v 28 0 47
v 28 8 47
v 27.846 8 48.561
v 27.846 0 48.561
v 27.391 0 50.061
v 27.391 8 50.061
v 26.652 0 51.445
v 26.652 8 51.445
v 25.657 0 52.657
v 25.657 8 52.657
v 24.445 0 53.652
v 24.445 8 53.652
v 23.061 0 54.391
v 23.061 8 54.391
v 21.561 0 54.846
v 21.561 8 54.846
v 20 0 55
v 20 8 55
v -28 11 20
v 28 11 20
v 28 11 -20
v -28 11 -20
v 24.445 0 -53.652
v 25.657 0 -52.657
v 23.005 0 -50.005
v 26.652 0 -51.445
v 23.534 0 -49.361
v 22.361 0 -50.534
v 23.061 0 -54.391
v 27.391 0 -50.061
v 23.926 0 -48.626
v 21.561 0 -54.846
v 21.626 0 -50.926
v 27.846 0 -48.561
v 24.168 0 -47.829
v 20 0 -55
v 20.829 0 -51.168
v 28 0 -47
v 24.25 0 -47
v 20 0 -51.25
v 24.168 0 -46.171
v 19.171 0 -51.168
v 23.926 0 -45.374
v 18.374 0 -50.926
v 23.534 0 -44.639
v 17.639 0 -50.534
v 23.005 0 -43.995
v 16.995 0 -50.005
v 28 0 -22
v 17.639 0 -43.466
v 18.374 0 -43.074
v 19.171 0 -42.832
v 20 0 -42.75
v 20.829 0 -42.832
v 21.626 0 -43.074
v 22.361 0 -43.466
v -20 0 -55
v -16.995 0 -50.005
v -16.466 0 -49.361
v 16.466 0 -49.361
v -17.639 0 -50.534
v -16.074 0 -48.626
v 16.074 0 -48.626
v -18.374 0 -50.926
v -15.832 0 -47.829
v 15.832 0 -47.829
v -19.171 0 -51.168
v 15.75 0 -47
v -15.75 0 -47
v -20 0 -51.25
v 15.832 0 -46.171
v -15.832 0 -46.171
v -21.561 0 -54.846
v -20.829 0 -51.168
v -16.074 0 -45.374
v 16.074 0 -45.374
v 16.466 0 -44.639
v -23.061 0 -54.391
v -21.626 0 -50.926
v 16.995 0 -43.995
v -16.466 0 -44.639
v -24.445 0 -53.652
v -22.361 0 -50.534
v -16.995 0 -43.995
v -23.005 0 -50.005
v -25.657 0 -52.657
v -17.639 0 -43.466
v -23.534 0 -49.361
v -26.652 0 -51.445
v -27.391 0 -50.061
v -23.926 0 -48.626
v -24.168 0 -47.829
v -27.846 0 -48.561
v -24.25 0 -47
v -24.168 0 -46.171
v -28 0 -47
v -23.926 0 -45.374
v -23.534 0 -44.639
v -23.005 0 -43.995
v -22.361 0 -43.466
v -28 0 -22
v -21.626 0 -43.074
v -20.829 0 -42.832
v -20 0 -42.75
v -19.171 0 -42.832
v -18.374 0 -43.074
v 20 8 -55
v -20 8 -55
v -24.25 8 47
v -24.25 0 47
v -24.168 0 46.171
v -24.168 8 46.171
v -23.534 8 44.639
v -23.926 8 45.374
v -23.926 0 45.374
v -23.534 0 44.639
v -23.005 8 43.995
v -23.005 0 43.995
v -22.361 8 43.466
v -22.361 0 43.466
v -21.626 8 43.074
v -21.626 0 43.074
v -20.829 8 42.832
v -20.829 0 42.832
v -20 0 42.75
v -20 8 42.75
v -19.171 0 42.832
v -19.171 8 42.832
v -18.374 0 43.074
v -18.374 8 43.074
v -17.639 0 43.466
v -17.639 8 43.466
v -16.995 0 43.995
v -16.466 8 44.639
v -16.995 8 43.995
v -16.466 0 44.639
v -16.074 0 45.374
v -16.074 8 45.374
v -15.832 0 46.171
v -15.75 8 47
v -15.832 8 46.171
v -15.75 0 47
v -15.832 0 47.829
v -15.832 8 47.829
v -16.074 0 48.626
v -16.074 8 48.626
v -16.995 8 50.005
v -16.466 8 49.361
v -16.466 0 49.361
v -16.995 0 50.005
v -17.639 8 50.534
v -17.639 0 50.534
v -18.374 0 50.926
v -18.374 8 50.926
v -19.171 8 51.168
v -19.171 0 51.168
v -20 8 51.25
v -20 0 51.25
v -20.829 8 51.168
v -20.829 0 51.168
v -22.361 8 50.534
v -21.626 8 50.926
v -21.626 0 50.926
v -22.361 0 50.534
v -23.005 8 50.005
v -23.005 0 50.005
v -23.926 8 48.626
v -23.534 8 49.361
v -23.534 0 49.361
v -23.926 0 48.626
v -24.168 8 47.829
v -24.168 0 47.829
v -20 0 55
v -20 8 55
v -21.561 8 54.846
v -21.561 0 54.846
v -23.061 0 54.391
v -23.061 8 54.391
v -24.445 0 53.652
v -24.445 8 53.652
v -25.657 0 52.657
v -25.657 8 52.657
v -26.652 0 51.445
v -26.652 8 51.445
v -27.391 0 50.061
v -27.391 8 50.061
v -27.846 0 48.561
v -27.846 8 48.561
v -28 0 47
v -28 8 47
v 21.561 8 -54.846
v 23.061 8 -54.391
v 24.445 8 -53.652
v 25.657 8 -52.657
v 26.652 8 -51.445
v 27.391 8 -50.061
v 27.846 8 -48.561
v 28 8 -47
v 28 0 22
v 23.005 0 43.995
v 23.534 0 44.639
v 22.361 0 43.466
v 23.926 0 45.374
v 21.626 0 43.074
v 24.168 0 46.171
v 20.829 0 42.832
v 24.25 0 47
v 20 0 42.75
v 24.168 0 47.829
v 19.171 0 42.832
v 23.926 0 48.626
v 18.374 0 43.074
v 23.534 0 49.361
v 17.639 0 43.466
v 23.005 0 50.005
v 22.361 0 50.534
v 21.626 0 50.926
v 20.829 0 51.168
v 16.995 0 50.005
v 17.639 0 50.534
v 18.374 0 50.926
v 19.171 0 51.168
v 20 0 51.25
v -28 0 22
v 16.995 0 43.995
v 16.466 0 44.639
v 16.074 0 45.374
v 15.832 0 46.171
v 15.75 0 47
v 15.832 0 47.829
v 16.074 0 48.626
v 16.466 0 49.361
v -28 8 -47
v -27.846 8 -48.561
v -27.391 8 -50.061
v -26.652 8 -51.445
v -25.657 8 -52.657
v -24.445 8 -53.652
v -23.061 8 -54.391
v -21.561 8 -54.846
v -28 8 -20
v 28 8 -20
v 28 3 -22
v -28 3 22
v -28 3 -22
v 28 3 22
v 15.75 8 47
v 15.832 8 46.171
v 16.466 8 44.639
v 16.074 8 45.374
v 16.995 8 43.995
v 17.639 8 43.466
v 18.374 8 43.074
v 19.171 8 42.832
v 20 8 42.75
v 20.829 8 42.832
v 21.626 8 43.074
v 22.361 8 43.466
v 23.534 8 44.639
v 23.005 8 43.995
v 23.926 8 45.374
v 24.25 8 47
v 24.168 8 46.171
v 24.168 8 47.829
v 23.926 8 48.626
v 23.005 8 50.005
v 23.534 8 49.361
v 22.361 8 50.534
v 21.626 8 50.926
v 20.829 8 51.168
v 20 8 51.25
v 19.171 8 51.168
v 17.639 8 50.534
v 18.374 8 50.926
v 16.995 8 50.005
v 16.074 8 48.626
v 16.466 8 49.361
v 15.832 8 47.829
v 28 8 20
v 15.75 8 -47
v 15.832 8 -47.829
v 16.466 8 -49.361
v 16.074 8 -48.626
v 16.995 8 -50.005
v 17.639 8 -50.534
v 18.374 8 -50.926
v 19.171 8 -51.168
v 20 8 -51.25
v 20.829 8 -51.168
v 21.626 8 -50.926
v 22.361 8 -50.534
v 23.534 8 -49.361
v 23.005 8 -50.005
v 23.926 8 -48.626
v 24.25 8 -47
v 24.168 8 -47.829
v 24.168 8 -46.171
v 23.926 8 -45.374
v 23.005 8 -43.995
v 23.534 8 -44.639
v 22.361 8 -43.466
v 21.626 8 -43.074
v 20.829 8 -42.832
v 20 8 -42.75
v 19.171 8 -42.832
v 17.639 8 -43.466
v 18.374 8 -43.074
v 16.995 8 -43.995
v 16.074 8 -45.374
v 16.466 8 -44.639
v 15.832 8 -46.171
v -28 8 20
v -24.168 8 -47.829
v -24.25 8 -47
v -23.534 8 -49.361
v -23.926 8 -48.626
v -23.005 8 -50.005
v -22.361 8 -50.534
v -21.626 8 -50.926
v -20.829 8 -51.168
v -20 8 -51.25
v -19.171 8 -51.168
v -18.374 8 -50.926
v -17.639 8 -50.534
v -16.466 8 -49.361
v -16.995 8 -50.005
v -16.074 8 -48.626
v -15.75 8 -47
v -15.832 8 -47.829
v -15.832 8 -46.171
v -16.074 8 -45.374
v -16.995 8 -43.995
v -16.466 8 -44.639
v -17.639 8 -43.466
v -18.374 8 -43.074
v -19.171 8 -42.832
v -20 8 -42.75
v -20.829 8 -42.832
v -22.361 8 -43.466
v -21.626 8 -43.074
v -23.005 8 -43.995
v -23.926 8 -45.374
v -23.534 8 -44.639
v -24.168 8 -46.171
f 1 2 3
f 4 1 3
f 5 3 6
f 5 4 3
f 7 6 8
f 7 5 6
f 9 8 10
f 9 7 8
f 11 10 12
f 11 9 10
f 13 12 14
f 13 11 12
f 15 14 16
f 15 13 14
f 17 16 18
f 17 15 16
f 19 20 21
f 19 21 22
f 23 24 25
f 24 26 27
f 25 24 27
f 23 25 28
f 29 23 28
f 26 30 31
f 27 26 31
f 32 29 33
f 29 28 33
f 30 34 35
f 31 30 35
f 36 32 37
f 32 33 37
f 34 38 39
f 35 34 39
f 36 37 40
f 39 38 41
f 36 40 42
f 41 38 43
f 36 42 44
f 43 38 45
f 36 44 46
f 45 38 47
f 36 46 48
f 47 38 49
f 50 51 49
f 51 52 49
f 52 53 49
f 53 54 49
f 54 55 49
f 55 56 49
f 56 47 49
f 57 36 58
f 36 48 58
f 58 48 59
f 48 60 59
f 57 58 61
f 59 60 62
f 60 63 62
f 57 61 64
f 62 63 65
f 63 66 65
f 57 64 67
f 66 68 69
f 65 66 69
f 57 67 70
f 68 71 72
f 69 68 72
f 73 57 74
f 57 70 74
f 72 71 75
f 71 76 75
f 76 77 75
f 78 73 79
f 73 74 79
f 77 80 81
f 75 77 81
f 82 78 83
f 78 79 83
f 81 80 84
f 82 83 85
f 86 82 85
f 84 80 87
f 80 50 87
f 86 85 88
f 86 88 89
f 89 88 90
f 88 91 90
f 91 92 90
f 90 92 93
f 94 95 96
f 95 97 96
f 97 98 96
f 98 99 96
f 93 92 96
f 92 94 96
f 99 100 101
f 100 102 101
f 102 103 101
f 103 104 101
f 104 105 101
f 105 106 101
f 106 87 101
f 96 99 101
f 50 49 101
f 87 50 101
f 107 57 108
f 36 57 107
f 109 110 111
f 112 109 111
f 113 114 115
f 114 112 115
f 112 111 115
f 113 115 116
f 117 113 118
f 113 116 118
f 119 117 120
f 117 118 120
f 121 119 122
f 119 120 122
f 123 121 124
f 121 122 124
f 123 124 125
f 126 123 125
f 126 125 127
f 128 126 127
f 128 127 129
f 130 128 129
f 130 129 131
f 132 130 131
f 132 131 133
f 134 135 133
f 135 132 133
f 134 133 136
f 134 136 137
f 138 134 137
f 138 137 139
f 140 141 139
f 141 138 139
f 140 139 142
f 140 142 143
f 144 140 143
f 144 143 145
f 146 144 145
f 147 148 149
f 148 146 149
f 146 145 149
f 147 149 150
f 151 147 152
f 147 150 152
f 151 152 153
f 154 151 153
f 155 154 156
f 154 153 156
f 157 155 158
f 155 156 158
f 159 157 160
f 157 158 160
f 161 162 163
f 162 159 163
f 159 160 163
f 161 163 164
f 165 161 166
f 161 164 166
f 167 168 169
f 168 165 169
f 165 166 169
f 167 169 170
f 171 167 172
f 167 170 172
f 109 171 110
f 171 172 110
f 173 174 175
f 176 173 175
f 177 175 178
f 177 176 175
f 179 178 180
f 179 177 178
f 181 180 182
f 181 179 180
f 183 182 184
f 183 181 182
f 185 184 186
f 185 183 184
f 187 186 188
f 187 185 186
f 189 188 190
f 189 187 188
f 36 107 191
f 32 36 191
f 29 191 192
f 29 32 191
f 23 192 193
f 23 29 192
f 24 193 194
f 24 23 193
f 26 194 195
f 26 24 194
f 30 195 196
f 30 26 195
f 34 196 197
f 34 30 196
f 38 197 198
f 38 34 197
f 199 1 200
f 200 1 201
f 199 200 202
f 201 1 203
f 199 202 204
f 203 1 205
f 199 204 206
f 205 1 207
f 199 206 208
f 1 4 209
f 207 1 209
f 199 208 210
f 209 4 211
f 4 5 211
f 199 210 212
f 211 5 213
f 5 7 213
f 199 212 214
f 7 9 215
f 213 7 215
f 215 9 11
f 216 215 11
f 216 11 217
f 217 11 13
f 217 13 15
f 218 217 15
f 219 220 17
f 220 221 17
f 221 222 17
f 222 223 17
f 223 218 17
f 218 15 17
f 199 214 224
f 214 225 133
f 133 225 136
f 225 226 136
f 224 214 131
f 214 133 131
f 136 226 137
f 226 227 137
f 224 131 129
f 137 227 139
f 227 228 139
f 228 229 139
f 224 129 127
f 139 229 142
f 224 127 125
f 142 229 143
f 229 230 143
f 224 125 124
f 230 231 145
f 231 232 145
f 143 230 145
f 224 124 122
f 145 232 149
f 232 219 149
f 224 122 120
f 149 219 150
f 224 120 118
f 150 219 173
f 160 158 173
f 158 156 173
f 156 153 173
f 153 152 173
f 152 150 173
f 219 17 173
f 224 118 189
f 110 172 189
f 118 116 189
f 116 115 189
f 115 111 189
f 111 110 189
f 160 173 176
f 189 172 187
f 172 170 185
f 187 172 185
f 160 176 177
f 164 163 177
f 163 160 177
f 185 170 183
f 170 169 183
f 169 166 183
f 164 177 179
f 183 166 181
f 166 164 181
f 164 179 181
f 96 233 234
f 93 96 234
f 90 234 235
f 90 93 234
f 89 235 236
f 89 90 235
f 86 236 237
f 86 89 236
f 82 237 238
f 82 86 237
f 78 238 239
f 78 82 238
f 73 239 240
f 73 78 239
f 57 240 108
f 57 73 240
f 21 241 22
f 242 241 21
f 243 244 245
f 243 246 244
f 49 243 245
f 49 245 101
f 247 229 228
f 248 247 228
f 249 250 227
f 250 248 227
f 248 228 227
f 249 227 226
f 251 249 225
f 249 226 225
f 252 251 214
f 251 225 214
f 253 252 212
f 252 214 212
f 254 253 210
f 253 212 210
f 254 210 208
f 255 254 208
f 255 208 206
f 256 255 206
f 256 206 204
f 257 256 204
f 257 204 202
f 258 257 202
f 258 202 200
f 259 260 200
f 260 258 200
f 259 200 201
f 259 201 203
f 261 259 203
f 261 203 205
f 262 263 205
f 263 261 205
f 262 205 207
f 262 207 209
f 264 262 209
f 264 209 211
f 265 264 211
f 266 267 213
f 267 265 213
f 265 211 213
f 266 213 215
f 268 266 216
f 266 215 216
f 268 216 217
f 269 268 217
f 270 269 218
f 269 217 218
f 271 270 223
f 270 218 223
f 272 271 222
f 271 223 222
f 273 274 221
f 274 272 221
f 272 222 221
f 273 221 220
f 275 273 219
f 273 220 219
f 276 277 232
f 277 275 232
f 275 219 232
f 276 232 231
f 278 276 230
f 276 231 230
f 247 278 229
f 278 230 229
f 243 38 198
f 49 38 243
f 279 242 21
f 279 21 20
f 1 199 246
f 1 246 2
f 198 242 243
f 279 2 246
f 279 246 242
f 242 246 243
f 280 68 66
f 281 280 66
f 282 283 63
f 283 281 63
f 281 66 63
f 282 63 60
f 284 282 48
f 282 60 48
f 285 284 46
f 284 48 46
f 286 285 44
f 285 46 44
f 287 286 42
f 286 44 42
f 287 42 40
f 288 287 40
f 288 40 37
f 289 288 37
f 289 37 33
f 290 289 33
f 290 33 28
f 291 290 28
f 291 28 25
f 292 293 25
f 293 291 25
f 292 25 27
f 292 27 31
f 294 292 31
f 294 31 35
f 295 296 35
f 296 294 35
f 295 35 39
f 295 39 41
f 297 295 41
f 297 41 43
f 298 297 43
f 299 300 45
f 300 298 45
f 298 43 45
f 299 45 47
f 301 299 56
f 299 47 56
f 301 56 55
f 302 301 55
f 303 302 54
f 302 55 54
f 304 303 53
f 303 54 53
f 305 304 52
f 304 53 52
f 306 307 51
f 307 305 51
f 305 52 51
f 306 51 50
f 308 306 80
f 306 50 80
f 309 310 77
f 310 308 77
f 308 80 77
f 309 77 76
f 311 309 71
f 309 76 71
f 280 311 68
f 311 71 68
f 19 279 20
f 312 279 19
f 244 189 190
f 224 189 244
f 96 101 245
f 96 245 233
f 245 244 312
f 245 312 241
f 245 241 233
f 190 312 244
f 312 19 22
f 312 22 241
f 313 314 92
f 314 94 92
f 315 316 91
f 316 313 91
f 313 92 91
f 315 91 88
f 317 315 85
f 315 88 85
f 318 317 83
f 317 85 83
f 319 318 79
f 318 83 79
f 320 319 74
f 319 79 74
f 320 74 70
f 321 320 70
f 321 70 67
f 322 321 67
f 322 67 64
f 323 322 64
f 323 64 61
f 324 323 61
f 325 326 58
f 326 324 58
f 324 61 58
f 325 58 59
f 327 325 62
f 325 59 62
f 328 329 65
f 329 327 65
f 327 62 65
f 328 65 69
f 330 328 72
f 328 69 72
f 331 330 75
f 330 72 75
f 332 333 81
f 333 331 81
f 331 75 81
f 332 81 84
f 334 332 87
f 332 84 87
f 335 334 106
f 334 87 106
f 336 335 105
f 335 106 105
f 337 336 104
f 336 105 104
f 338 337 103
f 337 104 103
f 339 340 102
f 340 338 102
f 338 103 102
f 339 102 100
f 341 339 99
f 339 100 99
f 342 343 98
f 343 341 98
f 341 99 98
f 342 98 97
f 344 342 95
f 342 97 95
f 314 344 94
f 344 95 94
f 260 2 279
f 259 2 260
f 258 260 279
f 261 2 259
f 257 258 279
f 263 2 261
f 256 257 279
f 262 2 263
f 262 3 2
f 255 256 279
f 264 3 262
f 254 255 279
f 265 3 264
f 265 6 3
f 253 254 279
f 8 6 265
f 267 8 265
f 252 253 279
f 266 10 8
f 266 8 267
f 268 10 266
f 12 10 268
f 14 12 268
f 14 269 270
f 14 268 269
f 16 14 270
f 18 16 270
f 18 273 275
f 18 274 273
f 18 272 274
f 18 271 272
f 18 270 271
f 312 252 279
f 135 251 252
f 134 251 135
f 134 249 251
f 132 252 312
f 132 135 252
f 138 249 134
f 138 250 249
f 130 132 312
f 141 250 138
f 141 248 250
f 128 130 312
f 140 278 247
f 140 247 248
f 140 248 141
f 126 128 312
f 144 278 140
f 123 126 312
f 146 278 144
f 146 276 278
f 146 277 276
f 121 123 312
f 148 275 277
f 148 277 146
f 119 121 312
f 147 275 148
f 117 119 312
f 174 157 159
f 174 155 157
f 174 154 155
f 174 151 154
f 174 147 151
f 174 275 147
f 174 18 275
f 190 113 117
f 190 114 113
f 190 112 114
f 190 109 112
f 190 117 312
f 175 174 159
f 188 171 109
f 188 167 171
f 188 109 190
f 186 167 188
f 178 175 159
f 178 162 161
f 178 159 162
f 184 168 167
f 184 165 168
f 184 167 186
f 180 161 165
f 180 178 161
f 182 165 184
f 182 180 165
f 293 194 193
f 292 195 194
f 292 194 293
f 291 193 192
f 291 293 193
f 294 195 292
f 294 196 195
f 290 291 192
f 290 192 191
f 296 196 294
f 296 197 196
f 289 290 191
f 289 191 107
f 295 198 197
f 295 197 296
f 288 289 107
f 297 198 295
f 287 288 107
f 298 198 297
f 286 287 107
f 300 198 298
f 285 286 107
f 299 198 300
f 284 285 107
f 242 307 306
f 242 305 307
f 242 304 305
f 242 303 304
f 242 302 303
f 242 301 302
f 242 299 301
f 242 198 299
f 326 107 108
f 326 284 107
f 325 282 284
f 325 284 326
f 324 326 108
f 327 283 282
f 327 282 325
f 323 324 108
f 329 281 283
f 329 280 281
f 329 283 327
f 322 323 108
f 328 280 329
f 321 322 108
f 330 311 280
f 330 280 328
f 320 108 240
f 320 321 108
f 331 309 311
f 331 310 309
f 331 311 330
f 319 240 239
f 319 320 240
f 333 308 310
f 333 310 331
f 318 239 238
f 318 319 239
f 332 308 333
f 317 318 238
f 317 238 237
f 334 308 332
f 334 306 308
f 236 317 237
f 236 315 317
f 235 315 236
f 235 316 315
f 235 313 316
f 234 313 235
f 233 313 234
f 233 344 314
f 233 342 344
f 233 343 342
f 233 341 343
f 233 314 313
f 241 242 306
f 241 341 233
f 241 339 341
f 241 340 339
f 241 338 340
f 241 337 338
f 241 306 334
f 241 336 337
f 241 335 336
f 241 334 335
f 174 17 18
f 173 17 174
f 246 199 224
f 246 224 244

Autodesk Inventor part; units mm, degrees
ref_plane "YZ Plane" through (0, 0, 0) normal (1, 0, 0) x (0, 1, 0)
ref_plane "XZ Plane" through (0, 0, 0) normal (0, 1, 0) x (-1, 0, 0)
ref_plane "XY Plane" through (0, 0, 0) normal (0, 0, 1) x (1, 0, 0)
sketch "Boceto1" plane through (0, 0, 0) normal (0, 1, 0) x (-1, 0, 0)
  line L0 (-20, 55) -> (20, 55)
  line L1 (28, 47) -> (28, -47)
  line L2 (20, -55) -> (-20, -55)
  line L3 (-28, -47) -> (-28, 47)
  line L4 (-28, 55) -> (28, -55) construction
  line L5 (28, 55) -> (-28, -55) construction
  arc A0 (28, 47) -> (20, 55) centre (20, 47) ccw
  arc A1 (20, -55) -> (28, -47) centre (20, -47) ccw
  arc A2 (-28, -47) -> (-20, -55) centre (-20, -47) ccw
  arc A3 (-20, 55) -> (-28, 47) centre (-20, 47) ccw
  circle A4 centre (20, 47) radius 4.25
  circle A5 centre (-20, 47) radius 4.25
  circle A6 centre (20, -47) radius 4.25
  circle A7 centre (-20, -47) radius 4.25
  line L6 (-28, 20) -> (28, 20)
  line L7 (28, 20) -> (28, -20)
  line L8 (28, -20) -> (-28, -20)
  line L9 (-28, -20) -> (-28, 20)
  line L10 (-28, 20) -> (28, -20) construction
  line L11 (28, 20) -> (-28, -20) construction
  point P0 (0, 0)
  dimension "d0" = 56
  dimension "d1" = 110
  dimension "d2" = 8
  dimension "d3" = 8.5
  dimension "d4" = 8.5
  dimension "d5" = 8.5
  dimension "d6" = 8.5
  dimension "d7" = 56
  dimension "d8" = 40
extrude "Extrusión1" add sketch "Boceto1" along normal blind 8 contours L0 A0 L1 L6 L3 A3 | L8 L1 A1 L2 A2 L3
extrude "Extrusión2" add sketch "Boceto1" along normal blind 11 contours L6 L1 L8 L3
sketch "Boceto2" plane through (28, 0, 47) normal (1, 0, 0) x (0, 0, -1)
  line L0 (25, 3) -> (69, 3)
  line L1 (69, 3) -> (69, 0)
  line L2 (69, 0) -> (25, 0)
  line L3 (25, 0) -> (25, 3)
  line L4 (0, 0) -> (94, 0) projected
  point P0 (47, 0)
  point P1 (47, 0)
  dimension "d13" = 44
  dimension "d14" = 3
extrude "Extrusión3" cut sketch "Boceto2" against normal through all
properties part number "Base polea"
